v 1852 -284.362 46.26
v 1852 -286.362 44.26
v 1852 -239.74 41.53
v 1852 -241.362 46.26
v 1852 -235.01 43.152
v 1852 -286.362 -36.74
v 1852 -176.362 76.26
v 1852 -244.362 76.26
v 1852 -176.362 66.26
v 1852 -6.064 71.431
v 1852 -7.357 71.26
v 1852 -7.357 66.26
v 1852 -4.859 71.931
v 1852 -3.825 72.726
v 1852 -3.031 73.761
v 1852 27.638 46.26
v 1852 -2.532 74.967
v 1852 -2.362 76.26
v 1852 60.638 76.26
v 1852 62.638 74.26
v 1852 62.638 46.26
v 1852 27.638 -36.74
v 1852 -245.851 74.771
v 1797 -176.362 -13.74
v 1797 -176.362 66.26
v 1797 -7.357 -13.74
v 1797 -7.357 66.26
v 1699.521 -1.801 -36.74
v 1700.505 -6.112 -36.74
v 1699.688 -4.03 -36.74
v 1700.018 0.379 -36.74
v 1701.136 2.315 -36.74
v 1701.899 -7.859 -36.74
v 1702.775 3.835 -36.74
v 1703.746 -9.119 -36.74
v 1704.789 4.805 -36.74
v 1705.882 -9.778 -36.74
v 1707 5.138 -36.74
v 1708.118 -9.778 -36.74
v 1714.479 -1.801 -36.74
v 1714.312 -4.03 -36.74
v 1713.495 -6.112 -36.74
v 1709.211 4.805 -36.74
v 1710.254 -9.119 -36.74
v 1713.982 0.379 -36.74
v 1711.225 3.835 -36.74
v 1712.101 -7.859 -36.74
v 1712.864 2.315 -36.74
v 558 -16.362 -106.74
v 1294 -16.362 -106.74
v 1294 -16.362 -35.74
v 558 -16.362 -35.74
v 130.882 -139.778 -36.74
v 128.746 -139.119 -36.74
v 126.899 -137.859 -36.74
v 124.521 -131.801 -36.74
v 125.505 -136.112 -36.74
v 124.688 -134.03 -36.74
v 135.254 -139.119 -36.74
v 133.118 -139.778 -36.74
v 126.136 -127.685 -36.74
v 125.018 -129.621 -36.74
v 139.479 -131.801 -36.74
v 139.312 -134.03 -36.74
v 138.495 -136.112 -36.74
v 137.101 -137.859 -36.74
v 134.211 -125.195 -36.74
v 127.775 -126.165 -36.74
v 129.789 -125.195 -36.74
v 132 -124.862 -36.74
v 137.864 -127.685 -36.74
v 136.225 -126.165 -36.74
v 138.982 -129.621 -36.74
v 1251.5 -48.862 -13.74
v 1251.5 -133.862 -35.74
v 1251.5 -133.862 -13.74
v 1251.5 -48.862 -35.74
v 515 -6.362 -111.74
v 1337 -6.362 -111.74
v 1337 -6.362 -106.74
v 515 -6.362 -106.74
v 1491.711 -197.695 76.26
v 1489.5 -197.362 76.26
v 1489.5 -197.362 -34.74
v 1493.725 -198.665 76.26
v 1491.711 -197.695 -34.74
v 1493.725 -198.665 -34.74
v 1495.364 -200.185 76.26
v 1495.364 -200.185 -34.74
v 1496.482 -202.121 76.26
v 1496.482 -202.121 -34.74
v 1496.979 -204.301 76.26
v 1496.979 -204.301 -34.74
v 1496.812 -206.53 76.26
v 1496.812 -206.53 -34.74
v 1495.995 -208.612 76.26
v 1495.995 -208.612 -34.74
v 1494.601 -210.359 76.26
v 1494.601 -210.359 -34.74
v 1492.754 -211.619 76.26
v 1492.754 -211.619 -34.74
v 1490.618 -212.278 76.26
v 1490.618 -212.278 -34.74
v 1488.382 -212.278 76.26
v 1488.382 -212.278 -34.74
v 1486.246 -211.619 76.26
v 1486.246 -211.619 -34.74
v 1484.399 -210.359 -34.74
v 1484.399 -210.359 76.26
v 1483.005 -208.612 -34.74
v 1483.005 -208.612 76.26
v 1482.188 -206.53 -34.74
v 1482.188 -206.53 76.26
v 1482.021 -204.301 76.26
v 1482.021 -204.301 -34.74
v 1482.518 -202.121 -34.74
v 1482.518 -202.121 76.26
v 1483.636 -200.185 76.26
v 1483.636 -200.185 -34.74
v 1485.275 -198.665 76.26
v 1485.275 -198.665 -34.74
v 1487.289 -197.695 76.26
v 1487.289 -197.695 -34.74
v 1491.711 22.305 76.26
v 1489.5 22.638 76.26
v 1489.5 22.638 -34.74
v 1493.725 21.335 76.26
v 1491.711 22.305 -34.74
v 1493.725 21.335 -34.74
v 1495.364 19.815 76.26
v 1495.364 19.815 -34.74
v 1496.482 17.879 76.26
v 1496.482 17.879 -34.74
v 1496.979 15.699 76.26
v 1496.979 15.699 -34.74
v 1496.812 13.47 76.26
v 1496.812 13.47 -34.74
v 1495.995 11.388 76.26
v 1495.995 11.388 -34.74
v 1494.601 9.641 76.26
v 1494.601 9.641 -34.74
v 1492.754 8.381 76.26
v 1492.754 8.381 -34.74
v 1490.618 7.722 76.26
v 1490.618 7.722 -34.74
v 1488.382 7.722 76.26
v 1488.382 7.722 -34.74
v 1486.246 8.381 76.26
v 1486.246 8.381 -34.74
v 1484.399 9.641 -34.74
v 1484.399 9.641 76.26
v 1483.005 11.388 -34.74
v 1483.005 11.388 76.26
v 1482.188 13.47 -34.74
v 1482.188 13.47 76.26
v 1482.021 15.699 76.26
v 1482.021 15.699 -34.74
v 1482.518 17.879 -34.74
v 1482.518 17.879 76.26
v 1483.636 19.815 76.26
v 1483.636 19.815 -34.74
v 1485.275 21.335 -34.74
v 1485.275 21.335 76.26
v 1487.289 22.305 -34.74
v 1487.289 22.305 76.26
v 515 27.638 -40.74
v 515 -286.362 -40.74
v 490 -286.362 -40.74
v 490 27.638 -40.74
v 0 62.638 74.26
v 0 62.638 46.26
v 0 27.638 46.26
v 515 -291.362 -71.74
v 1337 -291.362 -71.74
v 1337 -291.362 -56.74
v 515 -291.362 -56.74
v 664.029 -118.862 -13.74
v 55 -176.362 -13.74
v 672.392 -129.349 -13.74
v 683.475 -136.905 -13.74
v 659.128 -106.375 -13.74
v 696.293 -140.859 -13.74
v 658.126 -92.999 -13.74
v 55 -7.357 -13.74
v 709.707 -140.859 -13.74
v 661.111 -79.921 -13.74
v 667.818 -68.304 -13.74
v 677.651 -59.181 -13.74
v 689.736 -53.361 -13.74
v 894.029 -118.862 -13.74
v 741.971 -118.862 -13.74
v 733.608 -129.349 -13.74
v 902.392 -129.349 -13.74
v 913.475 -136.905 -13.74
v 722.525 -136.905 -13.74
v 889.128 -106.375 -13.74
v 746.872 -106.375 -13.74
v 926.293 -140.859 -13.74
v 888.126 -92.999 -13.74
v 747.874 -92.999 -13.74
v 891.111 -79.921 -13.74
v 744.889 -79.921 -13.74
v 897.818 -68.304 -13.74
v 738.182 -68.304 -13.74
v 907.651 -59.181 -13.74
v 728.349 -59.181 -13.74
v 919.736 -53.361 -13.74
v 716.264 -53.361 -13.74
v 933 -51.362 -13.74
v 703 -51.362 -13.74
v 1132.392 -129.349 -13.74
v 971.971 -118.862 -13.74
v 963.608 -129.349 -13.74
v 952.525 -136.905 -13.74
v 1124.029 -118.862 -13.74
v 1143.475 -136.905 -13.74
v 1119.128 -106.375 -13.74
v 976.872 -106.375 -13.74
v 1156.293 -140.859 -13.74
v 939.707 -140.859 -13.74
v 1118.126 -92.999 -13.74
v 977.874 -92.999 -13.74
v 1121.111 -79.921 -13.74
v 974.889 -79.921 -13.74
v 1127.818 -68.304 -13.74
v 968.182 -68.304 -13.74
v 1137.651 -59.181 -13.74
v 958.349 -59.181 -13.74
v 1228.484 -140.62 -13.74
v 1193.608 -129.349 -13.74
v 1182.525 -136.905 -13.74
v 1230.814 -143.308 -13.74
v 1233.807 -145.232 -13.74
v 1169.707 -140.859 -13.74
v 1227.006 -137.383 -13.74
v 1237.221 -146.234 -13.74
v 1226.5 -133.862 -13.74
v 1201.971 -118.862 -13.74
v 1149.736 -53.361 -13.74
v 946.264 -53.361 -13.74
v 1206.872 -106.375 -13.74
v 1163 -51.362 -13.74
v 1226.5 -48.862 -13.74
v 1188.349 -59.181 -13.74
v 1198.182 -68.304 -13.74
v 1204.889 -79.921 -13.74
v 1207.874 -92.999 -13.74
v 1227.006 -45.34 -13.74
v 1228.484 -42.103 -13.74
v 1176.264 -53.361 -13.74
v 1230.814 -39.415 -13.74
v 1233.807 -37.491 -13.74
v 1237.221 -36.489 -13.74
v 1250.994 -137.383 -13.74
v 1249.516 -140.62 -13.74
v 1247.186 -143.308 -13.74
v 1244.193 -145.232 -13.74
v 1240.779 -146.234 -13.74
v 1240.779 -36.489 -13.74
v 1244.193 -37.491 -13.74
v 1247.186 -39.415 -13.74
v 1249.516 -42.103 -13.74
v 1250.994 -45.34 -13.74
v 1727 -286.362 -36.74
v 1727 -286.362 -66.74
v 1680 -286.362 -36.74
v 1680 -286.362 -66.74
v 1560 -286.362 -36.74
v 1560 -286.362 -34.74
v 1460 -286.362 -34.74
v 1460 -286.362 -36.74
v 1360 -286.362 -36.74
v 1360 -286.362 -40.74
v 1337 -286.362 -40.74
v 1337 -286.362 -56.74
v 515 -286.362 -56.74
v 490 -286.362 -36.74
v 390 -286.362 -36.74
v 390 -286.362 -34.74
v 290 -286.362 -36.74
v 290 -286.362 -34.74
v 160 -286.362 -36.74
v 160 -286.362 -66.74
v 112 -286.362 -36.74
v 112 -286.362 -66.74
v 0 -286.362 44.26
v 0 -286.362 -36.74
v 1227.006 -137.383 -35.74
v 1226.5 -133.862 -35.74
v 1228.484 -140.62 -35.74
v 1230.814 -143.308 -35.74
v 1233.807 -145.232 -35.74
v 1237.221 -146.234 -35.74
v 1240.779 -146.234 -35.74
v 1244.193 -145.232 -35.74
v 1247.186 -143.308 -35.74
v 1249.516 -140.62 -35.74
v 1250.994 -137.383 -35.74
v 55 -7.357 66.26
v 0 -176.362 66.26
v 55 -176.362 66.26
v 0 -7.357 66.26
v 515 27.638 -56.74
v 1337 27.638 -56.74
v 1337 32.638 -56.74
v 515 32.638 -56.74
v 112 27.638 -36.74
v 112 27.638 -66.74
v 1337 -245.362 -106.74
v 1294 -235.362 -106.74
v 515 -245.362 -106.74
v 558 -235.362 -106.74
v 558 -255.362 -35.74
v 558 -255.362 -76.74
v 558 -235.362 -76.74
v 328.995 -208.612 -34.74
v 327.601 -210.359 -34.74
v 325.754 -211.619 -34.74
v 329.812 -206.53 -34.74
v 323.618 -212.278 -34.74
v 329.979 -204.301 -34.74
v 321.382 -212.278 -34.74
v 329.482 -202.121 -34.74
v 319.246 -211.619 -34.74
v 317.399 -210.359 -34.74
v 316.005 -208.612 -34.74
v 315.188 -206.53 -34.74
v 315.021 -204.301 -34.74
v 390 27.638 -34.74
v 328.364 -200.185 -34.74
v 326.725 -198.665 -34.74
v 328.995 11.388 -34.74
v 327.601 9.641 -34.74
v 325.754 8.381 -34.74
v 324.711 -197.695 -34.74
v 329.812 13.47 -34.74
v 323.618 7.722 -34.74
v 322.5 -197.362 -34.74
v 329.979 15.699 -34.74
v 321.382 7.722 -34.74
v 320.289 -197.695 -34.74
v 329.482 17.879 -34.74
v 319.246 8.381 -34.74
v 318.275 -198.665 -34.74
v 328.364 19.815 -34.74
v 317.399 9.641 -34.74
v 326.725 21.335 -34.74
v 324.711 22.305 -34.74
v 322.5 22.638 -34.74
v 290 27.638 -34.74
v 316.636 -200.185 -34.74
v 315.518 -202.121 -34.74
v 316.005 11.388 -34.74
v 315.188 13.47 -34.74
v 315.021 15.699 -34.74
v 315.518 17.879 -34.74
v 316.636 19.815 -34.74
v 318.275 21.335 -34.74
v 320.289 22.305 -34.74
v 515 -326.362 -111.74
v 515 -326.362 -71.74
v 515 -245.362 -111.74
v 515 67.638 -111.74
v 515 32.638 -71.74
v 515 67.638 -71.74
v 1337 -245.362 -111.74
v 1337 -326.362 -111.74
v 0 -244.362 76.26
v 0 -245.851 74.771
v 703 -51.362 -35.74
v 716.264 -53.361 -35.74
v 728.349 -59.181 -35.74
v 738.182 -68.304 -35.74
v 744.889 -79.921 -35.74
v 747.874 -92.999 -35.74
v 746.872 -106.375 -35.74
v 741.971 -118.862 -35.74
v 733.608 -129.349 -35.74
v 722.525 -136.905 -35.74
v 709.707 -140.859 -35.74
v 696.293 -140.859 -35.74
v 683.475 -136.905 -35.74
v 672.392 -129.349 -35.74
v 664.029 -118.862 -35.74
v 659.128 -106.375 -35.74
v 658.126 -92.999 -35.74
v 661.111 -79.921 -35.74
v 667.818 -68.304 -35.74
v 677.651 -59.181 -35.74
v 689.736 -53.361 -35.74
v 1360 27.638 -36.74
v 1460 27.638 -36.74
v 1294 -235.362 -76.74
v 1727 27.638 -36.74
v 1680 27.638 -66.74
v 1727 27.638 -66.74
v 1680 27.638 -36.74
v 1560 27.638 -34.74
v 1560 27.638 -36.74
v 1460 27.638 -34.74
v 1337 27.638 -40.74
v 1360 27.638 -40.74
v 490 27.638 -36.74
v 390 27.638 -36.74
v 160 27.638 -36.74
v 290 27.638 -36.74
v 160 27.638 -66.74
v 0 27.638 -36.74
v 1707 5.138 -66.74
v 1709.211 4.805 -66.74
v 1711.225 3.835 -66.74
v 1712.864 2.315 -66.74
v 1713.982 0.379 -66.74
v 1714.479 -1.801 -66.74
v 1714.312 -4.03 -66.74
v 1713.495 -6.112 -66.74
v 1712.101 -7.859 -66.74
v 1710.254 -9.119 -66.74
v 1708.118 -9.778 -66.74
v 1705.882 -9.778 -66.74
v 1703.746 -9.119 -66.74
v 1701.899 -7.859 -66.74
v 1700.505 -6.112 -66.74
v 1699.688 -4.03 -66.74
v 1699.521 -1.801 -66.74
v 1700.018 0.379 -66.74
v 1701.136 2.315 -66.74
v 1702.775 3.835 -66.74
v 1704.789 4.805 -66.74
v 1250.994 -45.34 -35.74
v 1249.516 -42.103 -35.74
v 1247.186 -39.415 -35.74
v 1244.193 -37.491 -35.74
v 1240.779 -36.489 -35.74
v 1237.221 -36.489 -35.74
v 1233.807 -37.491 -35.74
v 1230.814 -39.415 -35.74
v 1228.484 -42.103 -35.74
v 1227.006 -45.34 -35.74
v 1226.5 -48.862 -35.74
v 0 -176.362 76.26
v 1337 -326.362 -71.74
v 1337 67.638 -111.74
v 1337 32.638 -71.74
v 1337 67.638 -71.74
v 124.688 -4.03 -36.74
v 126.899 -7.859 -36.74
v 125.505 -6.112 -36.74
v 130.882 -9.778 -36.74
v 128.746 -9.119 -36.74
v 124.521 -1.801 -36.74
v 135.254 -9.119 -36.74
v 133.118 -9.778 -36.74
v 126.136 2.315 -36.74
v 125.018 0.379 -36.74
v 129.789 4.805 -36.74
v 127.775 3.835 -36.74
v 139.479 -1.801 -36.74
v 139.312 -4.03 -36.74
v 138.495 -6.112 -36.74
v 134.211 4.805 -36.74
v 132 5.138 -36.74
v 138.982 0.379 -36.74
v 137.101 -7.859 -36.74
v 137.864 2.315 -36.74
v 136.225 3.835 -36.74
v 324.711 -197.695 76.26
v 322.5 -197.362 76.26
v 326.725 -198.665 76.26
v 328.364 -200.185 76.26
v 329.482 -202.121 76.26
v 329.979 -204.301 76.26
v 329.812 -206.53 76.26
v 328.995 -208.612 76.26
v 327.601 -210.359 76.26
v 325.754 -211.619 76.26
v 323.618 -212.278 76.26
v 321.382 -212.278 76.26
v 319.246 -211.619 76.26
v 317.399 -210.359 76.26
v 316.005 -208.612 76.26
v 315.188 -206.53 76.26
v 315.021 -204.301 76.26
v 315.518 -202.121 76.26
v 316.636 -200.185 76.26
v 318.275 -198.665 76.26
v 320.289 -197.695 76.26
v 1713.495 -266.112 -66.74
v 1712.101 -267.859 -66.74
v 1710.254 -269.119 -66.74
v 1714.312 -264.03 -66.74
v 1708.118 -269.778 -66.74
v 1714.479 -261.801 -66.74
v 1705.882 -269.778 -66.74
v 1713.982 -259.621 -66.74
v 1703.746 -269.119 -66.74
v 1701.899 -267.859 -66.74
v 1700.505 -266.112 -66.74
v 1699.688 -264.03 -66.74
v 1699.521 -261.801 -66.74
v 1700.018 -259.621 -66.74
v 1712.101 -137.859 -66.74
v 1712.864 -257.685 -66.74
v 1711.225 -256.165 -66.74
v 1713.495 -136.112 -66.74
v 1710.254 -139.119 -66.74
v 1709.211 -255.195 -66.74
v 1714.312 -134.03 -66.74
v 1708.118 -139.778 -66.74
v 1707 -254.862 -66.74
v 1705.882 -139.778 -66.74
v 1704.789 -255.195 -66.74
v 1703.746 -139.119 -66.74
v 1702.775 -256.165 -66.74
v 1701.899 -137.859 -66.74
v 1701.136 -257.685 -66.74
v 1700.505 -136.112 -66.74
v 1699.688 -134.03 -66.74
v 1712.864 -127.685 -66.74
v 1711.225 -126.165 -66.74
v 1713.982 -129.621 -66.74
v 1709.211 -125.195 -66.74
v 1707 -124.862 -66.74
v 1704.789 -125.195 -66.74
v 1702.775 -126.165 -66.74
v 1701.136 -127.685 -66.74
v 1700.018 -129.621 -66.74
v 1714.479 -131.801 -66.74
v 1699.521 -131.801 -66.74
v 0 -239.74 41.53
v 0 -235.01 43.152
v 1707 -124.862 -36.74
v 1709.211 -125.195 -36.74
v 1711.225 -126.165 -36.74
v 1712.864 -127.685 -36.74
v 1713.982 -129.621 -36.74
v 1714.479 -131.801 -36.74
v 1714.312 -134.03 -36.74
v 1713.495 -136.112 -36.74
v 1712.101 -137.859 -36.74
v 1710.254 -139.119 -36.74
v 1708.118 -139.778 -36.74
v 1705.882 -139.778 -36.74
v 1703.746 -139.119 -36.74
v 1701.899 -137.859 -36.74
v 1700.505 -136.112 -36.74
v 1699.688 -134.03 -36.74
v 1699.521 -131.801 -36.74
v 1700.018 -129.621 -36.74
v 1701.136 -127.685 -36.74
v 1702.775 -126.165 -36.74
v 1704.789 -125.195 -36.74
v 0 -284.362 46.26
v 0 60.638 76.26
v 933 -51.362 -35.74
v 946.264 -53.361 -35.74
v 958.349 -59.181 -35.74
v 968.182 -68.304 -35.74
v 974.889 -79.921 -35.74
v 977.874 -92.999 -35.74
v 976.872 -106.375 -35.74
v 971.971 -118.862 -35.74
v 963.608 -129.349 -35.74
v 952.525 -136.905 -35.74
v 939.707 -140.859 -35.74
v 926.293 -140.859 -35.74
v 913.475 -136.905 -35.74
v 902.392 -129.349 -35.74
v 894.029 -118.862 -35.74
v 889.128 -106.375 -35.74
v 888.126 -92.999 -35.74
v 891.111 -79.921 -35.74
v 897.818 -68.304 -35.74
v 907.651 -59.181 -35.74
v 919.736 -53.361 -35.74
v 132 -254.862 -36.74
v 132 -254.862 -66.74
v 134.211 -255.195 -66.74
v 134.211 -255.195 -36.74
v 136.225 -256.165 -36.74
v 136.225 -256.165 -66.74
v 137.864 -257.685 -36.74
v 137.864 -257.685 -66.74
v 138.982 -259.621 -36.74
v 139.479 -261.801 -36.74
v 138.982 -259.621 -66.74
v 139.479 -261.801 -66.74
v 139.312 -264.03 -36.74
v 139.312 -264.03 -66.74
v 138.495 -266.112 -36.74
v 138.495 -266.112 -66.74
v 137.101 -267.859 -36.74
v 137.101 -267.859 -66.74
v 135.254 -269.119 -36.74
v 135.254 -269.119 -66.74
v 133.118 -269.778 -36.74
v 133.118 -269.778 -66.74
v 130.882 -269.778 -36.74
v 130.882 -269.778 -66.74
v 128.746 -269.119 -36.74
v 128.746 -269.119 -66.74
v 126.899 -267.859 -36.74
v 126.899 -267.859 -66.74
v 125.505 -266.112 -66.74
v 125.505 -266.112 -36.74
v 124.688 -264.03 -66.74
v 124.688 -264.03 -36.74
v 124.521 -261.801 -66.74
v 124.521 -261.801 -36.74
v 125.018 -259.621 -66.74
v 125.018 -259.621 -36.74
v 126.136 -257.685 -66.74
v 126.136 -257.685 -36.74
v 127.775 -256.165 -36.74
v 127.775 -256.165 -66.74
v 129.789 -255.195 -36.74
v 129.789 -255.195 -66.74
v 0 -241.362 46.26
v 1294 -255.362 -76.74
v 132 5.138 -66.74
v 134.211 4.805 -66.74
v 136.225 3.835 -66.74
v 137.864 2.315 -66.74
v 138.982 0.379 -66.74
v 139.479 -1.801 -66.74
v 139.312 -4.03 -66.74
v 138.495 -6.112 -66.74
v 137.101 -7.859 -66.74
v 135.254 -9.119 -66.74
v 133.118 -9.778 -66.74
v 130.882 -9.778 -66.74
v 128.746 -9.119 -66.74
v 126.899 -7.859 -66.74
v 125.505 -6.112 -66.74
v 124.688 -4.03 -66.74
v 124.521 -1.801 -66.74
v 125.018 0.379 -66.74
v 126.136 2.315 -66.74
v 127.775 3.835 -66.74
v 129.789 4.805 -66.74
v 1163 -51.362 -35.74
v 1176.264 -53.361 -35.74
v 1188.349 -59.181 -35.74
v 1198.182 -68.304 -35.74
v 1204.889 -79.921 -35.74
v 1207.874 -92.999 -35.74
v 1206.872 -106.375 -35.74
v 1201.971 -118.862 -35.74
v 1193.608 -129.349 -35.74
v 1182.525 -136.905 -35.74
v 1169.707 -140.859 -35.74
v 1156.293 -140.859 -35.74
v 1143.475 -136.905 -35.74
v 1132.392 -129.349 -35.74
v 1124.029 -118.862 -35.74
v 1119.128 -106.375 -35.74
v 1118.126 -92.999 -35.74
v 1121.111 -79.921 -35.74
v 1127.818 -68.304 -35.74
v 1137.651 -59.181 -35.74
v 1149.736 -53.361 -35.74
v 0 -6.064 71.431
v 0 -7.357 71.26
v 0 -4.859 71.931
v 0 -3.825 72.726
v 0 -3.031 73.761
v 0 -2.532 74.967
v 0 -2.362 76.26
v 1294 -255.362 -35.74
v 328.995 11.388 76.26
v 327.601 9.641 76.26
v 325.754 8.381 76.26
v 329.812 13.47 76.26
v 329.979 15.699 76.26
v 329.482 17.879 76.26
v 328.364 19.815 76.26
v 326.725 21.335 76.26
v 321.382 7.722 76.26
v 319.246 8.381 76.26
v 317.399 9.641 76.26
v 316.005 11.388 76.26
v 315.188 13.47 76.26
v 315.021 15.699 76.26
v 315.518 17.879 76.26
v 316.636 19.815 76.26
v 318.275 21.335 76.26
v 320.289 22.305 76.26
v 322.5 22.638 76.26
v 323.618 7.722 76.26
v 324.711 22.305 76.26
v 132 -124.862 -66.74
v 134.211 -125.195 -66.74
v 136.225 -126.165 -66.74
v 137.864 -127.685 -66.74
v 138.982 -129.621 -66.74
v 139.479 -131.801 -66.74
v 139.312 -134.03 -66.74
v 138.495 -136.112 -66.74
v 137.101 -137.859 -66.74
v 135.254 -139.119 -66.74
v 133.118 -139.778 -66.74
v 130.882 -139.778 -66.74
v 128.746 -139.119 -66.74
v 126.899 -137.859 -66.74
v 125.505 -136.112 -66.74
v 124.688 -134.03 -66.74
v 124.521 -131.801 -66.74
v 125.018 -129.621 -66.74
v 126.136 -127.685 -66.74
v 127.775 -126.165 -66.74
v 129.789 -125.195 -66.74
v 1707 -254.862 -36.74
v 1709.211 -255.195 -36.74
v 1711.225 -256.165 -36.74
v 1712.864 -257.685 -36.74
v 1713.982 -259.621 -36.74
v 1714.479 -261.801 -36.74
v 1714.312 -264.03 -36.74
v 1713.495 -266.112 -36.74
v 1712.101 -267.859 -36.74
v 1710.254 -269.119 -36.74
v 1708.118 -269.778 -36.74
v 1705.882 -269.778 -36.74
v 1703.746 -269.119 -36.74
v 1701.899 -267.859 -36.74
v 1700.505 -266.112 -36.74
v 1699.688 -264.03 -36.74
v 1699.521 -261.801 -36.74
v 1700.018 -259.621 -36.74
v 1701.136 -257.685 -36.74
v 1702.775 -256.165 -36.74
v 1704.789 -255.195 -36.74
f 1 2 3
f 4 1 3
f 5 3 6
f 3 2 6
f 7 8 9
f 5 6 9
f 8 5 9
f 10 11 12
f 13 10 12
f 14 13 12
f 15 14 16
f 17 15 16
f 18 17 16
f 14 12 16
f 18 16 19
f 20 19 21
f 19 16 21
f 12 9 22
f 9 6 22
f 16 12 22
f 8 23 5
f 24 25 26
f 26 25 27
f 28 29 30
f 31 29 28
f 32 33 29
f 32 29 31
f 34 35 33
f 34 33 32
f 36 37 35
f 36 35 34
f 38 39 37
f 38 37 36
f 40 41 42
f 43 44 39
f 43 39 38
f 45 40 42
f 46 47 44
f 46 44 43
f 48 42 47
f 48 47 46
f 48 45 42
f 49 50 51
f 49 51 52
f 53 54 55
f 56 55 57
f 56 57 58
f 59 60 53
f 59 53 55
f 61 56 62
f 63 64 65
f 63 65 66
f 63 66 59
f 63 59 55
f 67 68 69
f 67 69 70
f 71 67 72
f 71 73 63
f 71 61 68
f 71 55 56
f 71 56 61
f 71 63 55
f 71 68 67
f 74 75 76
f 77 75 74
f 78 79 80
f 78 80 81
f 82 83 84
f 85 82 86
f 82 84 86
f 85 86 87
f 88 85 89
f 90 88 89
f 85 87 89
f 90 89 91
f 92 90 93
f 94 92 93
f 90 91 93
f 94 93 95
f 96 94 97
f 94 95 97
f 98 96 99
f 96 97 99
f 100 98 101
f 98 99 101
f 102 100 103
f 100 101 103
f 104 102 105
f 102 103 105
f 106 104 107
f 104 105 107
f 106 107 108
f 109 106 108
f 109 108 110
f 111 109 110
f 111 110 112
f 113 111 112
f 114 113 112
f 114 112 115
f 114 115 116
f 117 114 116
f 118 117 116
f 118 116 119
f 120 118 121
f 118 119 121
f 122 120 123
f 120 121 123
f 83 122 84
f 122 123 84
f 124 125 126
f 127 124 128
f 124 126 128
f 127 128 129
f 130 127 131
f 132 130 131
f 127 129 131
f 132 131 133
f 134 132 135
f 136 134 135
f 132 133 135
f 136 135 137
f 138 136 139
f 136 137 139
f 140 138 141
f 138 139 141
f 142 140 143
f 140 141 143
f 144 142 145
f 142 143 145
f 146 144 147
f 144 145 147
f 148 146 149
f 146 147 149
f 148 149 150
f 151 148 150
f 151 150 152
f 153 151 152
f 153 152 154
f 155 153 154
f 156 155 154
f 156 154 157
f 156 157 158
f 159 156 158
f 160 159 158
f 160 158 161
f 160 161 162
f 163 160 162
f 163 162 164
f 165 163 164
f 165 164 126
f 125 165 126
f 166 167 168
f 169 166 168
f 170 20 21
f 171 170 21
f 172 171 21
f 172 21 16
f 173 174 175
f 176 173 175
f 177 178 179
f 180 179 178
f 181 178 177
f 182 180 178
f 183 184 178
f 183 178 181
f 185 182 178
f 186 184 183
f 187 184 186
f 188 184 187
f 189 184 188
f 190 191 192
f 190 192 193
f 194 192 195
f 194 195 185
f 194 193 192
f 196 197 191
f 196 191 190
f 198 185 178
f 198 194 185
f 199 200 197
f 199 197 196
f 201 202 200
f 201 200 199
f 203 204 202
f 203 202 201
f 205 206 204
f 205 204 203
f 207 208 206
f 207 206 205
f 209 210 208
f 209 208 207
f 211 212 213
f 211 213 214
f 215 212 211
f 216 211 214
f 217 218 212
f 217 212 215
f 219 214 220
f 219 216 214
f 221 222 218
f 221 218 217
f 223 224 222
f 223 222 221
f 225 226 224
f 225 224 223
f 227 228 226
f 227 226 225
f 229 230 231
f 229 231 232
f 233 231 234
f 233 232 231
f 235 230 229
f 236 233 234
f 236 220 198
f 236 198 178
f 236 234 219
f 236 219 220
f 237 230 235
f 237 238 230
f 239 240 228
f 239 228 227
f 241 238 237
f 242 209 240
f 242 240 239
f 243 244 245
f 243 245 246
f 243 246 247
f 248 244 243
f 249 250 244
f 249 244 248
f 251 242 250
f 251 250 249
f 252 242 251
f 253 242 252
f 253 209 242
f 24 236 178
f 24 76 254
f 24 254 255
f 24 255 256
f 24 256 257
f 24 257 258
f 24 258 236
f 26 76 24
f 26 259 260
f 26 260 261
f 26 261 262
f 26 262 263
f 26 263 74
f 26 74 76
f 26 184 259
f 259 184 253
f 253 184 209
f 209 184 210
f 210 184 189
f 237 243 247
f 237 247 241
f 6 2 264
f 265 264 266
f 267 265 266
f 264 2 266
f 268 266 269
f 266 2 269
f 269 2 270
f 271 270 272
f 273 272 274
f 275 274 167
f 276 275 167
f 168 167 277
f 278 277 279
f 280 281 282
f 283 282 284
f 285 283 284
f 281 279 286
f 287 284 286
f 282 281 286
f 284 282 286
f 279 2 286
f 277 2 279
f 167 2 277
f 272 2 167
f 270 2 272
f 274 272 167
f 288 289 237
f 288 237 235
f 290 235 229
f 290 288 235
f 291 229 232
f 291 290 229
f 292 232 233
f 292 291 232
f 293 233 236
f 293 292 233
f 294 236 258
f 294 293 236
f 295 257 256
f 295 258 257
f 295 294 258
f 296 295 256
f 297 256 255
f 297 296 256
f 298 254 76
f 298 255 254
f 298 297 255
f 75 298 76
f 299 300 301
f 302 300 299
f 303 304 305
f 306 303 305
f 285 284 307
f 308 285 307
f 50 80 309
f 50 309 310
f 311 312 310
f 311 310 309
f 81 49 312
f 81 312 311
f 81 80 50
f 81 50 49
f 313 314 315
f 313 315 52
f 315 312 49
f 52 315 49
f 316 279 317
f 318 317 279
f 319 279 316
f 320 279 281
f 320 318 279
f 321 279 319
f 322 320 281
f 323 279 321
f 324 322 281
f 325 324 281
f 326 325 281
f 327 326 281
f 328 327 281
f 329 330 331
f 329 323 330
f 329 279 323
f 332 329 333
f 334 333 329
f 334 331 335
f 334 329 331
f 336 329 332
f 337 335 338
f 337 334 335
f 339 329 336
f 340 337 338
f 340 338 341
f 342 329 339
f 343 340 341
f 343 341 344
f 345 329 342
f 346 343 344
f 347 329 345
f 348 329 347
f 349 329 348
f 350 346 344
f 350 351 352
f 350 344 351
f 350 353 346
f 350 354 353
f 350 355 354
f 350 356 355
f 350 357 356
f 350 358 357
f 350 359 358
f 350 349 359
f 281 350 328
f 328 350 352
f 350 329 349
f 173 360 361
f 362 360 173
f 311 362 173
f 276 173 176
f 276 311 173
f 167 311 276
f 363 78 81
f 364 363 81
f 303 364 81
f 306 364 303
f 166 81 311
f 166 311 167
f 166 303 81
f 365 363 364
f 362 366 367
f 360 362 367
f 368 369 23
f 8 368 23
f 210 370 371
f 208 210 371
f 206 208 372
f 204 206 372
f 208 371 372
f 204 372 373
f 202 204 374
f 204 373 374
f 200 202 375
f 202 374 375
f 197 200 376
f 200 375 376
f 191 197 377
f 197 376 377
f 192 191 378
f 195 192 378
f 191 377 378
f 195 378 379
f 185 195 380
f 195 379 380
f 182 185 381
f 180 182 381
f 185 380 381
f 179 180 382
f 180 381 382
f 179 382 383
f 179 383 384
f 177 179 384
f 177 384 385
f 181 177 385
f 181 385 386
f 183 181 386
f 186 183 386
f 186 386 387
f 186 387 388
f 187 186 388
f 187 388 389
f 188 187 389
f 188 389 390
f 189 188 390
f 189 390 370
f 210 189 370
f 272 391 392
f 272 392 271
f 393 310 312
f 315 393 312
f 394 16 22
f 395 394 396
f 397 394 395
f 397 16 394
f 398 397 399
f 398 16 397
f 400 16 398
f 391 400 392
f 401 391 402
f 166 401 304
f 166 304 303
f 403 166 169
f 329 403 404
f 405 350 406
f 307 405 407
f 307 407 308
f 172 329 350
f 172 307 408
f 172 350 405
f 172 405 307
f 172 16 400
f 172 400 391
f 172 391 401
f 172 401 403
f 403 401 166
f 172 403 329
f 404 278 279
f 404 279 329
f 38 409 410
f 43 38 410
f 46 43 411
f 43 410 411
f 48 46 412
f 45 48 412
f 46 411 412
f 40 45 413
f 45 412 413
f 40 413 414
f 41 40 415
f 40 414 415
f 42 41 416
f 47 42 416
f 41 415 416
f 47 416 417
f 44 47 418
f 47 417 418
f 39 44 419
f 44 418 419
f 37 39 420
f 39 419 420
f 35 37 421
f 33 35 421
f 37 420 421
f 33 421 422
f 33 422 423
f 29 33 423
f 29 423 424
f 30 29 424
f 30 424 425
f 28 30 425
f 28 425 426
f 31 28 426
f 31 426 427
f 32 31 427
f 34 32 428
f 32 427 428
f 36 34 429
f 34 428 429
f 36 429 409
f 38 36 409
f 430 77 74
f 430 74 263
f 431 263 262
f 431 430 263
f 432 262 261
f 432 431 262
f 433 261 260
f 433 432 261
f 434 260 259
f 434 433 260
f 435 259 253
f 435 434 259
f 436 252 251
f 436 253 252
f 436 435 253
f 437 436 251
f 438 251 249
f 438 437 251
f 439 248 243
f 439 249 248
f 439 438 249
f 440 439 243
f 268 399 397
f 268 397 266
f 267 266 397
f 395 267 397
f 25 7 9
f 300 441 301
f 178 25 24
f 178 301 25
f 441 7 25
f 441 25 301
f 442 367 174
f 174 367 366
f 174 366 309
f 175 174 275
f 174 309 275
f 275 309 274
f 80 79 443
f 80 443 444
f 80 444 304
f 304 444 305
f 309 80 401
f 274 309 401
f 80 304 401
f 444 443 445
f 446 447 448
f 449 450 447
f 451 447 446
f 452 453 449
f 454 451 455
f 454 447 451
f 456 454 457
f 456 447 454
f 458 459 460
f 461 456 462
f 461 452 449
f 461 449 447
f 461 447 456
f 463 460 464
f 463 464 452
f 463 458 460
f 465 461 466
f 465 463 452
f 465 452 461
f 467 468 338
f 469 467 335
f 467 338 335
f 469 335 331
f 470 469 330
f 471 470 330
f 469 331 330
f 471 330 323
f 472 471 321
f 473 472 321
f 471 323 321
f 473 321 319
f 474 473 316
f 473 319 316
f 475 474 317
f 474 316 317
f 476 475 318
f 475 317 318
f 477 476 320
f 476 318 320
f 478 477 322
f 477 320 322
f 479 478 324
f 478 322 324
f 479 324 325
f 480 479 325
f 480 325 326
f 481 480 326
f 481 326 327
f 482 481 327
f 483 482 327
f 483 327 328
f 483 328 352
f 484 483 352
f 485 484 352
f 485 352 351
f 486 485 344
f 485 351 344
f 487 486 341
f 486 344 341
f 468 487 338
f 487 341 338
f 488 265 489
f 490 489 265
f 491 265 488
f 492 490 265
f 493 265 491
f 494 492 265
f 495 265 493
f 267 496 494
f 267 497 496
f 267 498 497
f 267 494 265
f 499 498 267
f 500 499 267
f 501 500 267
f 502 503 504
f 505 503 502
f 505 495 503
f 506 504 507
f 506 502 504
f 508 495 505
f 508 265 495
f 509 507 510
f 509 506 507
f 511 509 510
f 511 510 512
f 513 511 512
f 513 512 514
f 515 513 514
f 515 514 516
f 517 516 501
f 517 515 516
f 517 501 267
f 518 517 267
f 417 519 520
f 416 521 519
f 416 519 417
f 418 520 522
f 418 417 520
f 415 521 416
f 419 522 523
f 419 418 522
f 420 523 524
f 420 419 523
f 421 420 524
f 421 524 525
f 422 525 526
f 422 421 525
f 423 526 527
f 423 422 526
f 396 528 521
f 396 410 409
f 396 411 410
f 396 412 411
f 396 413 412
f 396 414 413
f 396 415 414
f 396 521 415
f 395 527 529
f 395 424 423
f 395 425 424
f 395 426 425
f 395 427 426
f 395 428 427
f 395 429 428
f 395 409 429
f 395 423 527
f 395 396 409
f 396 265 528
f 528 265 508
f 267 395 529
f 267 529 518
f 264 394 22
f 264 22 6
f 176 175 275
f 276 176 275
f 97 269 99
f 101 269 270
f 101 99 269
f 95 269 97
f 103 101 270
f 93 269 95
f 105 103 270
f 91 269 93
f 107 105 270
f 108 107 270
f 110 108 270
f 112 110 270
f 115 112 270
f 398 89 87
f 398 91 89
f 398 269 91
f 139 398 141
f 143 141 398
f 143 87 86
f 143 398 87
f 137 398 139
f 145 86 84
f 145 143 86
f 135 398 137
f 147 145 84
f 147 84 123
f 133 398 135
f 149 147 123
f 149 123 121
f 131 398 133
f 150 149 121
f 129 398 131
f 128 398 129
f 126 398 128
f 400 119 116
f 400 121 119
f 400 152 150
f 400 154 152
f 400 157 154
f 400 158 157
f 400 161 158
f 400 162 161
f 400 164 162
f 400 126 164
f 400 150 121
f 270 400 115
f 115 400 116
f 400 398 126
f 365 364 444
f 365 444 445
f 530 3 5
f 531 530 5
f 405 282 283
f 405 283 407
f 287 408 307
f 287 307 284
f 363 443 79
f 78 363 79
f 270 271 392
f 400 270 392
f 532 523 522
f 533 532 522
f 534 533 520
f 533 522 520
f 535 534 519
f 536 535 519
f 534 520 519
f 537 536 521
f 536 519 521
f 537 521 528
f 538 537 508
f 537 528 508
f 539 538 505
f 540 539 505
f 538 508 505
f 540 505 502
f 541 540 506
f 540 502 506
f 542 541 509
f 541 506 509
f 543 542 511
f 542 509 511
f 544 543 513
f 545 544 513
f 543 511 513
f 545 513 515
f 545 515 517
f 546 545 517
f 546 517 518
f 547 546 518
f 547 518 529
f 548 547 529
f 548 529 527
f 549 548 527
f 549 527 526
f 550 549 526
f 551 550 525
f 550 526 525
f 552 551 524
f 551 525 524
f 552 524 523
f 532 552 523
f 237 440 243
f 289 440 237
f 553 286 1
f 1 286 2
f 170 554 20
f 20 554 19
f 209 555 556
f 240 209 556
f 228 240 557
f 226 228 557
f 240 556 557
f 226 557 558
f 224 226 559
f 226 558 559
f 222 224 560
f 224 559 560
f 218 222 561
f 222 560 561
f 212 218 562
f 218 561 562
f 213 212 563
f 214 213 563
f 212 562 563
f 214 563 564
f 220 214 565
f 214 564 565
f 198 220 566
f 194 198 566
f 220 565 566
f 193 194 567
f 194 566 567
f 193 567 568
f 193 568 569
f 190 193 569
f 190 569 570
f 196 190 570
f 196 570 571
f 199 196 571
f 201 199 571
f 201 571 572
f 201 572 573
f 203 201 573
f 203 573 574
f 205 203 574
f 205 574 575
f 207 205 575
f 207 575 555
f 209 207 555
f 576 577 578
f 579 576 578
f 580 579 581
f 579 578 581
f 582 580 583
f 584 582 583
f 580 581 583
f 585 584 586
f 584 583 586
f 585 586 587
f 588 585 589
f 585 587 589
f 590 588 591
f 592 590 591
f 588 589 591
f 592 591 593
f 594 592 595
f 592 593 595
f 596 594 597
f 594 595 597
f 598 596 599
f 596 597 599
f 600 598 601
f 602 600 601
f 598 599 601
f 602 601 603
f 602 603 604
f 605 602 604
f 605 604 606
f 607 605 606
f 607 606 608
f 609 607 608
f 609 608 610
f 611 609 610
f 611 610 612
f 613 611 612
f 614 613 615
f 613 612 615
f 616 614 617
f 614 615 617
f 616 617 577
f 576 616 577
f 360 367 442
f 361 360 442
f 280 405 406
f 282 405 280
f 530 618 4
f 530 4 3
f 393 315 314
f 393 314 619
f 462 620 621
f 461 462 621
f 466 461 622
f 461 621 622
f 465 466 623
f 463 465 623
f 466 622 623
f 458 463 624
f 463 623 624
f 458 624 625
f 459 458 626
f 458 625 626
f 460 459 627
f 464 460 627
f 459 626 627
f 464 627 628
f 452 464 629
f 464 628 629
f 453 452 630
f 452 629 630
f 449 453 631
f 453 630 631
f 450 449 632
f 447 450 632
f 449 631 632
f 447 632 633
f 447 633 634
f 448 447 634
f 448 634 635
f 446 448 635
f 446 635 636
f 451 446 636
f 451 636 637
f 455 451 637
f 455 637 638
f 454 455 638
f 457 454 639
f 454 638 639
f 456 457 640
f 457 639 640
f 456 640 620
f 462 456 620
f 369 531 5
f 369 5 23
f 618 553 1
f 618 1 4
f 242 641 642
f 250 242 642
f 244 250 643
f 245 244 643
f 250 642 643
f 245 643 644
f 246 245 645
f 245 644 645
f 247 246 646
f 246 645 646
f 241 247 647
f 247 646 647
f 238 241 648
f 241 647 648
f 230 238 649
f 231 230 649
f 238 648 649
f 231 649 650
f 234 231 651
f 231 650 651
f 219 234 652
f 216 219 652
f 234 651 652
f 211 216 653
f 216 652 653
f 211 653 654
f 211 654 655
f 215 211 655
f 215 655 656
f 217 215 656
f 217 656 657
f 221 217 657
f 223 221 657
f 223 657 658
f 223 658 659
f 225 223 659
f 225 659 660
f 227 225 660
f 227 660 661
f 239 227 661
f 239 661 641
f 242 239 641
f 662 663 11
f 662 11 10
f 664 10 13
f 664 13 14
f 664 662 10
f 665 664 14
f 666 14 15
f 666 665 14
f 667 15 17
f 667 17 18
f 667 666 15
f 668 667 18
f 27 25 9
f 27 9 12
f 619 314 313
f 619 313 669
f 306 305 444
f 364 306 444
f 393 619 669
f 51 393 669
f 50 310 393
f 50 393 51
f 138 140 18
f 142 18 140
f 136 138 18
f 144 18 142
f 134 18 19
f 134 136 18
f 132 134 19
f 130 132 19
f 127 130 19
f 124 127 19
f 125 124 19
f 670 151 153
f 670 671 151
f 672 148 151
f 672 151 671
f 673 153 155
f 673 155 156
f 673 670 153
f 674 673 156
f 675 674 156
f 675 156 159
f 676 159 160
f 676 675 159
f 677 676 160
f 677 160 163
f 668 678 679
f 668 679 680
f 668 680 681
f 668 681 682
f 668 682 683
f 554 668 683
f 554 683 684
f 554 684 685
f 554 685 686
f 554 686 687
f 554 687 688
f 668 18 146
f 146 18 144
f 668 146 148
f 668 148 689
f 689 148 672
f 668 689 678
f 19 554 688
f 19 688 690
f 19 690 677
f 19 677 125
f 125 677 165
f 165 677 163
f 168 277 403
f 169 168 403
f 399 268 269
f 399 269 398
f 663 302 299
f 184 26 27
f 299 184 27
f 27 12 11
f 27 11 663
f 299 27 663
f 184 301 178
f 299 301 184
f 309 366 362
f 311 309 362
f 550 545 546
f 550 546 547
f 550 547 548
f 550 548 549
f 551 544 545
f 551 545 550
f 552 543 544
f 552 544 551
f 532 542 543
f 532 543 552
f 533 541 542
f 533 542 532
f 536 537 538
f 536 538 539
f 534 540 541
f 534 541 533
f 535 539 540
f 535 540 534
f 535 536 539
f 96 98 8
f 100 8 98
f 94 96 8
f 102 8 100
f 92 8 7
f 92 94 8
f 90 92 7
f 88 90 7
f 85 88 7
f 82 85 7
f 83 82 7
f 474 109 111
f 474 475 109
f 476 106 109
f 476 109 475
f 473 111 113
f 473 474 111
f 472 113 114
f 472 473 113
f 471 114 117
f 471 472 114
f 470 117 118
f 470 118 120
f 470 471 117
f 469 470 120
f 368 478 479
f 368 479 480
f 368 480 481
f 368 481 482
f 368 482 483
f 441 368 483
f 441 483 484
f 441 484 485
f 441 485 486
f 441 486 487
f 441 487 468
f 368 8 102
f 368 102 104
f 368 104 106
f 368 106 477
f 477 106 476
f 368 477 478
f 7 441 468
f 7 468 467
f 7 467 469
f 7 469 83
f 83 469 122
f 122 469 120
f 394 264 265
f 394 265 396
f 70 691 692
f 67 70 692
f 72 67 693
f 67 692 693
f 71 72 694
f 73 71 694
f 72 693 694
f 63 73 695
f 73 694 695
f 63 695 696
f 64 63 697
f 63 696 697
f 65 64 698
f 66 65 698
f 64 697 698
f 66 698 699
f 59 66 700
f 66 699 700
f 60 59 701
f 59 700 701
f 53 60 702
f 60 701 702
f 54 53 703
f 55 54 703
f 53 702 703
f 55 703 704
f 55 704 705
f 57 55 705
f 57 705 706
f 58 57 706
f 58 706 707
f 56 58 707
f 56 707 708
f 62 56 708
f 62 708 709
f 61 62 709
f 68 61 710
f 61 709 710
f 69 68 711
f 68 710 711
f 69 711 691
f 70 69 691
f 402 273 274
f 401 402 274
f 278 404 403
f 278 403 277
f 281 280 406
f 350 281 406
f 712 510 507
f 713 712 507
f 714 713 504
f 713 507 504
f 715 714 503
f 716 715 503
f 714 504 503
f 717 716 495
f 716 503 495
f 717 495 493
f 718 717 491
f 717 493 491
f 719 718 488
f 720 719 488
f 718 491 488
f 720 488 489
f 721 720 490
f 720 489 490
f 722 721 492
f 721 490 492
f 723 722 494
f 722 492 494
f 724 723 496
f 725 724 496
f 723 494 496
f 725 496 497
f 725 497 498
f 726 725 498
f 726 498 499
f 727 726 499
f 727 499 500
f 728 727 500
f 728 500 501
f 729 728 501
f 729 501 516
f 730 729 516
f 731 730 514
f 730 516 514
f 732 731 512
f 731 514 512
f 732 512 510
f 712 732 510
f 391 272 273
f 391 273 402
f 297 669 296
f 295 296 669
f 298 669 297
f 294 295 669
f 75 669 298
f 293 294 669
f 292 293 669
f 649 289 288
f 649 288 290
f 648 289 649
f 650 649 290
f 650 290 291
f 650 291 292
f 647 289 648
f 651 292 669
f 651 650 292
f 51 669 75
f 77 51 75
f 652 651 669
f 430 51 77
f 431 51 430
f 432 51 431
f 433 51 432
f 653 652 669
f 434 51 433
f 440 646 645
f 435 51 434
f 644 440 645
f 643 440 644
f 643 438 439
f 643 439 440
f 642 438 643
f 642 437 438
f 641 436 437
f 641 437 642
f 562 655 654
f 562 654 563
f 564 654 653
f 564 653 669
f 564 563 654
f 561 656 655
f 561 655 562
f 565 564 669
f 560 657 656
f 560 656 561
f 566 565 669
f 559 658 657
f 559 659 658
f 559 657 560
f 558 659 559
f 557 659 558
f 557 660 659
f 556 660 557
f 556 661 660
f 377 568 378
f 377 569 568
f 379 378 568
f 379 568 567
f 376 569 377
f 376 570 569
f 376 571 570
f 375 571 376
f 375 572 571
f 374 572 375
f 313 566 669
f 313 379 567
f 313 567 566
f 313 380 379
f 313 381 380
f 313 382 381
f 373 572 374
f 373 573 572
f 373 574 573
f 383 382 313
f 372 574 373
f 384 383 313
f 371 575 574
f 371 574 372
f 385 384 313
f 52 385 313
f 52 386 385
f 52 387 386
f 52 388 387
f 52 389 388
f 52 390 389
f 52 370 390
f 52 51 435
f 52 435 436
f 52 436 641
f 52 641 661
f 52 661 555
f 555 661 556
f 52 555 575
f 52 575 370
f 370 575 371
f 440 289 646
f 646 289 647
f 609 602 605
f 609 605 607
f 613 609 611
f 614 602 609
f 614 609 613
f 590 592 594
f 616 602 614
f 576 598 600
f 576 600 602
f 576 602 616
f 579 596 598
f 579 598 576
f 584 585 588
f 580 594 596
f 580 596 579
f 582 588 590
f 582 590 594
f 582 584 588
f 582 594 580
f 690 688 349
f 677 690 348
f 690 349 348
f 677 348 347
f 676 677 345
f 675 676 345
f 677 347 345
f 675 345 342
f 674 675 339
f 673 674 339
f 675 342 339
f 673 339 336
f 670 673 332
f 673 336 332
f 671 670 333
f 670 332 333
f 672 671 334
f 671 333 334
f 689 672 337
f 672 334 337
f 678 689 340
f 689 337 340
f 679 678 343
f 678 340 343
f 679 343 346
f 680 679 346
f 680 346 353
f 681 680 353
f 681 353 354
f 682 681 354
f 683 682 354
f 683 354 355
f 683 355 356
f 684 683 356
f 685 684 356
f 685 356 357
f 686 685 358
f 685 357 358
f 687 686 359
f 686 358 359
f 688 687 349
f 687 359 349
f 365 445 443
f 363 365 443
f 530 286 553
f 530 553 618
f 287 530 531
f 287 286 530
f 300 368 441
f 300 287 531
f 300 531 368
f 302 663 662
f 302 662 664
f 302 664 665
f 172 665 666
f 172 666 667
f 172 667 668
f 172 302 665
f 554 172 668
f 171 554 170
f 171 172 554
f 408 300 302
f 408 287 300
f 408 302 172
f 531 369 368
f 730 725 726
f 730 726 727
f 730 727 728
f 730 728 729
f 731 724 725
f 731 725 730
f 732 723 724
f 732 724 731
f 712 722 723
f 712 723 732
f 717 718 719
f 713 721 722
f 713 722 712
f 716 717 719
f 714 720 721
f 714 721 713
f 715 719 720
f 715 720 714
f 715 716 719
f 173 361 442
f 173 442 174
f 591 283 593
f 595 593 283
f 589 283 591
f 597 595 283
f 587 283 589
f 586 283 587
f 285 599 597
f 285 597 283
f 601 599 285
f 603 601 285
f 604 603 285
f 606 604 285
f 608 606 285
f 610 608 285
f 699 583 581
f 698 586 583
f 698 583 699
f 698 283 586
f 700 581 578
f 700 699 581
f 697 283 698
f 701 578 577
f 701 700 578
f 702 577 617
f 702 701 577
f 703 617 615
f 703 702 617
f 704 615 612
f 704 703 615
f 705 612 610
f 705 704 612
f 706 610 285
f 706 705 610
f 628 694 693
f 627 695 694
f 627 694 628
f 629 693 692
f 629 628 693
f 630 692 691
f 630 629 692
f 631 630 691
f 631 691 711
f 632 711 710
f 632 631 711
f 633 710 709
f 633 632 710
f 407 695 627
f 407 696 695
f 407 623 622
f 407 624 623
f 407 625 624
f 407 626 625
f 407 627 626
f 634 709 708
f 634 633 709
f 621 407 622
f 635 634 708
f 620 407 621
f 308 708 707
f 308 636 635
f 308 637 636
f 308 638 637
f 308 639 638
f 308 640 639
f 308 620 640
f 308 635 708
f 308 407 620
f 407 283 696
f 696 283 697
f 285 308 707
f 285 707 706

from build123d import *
from OCP.BRepFilletAPI import BRepFilletAPI_MakeChamfer

# Parameters (mm, degrees)
EXTRUDE_1_DEPTH      = 1852
FILLET_1_R           = 5
CHAMFER_1_SIZE       = 2
CHAMFER_1_SIZE2      = 1.574468085
EXTRUDE_2_DEPTH      = 822
SKETCH_5_W           = 47
SKETCH_5_H           = 314
EXTRUDE_3_DEPTH      = 30
SKETCH_7_W           = 100
SKETCH_7_H           = 314
CUT_EXTRUDE_1_DEPTH  = 2
SKETCH_8_W           = 23
SKETCH_8_H           = 314
EXTRUDE_4_DEPTH      = 4
SKETCH_9_W           = 48
SKETCH_9_H           = 314
EXTRUDE_5_DEPTH      = 30
SKETCH_10_W          = 100
SKETCH_10_H          = 314
CUT_EXTRUDE_2_DEPTH  = 2
SKETCH_11_W          = 25
SKETCH_11_H          = 314
EXTRUDE_6_DEPTH      = 4
SKETCH_12_W          = 1742
SKETCH_12_H          = 169.004058013
CUT_EXTRUDE_3_DEPTH  = 80
SKETCH_13_W          = 822
SKETCH_13_H          = 239
CUT_EXTRUDE_4_DEPTH  = 5
SKETCH_14_W          = 736
SKETCH_14_H          = 219
CUT_EXTRUDE_5_DEPTH  = 71
SKETCH_15_R          = 45
CUT_EXTRUDE_6_DEPTH  = 1884.868315719
SKETCH_16_W          = 736
SKETCH_16_H          = 41
CUT_EXTRUDE_7_DEPTH  = 20
SKETCH_17_R          = 7.5
CUT_EXTRUDE_8_DEPTH  = 30
SKETCH_18_R          = 7.5
CUT_EXTRUDE_9_DEPTH  = 113
SKETCH_21_R          = 7.5
CUT_EXTRUDE_11_DEPTH = 111
SKETCH_23_R          = 7.5
CUT_EXTRUDE_12_DEPTH = 111


with BuildPart() as part:
    # 草图2 → 凸台-拉伸1 (new body)
    with BuildSketch(Plane(origin=(0, 0, 0), x_dir=(0, 0, -1), z_dir=(1, 0, 0))):
        Polygon((-76.260223553, 62.638496495), (-46.260223553, 62.638496495), (-46.260223553, 27.638496495), (36.739776447, 27.638496495), (36.739776447, -286.361503505), (-46.260223553, -286.361503505), (-46.260223553, -241.361503505), (-41.530493824, -239.739881883), (-43.152115445, -235.010152153), (-76.260223553, -246.361503505), (-76.260223553, -176.361503505), (-66.260223553, -176.361503505), (-66.260223553, -7.357445492), (-71.260223553, -7.357445492), (-71.260223553, -2.361503505), (-76.260223553, -2.361503505), align=None)
    extrude(amount=EXTRUDE_1_DEPTH)

    # 圆角1
    # the kernel refuses this fillet: 5 mm, written as the material it adds along each edge
    with BuildSketch(Plane(origin=(0, -2.361503505, 71.260223553), x_dir=(0, -1, 0), z_dir=(1, 0, 0))) as fillet_1_piece_1_section:
        with BuildLine():
            CenterArc((FILLET_1_R, -FILLET_1_R), FILLET_1_R, 90, 90)
            Line((0, -FILLET_1_R), (0, 0))
            Line((0, 0), (FILLET_1_R, 0))
        make_face()
    fillet_1_piece_1 = extrude(amount=1852, mode=Mode.PRIVATE)
    fillet_1_piece_1 = split(fillet_1_piece_1, bisect_by=Plane(origin=(926, -7.357445492, 72.392274368), z_dir=(0, 1, 0)), keep=Keep.TOP, mode=Mode.PRIVATE)
    add(fillet_1_piece_1)

    # 倒角1: one chamfer whose edges measure the first distance from different faces: ONE call of the kernel's chamfer builder (chamfer() names one face for all edges)
    chamfer_1_edges_1 = [part.edges().sort_by_distance(p)[0] for p in [
        (926, 62.638496495, 76.260223553),
        (926, -286.361503505, 46.260223553),
    ]]
    chamfer_1_edges_2 = [part.edges().sort_by_distance(p)[0] for p in [
        (926, -246.361503505, 76.260223553),
    ]]
    chamfer_1_side_2 = [part.faces().sort_by_distance(p)[0] for p in [
        (926, -211.361503505, 76.260223553),
    ]]
    chamfer_1 = BRepFilletAPI_MakeChamfer(part.part.solid().wrapped)
    for e in chamfer_1_edges_1:
        chamfer_1.Add(CHAMFER_1_SIZE, e.wrapped)
    for e in chamfer_1_edges_2:
        chamfer_1.Add(CHAMFER_1_SIZE, CHAMFER_1_SIZE2, e.wrapped, chamfer_1_side_2[0].wrapped)  # the first distance lies on this face
    add(Compound.cast(chamfer_1.Shape()), mode=Mode.REPLACE)

    # 草图4 → 凸台-拉伸2 (add)
    with BuildSketch(Plane(origin=(1337, 0, 0), x_dir=(0, 0, -1), z_dir=(1, 0, 0))):
        Polygon((36.739776447, 27.638496495), (56.739776447, 27.638496495), (56.739776447, 32.638496495), (71.739776447, 32.638496495), (71.739776447, 67.638496495), (111.739776447, 67.638496495), (111.739776447, -326.361503505), (71.739776447, -326.361503505), (71.739776447, -291.361503505), (56.739776447, -291.361503505), (56.739776447, -286.361503505), (36.739776447, -286.361503505), align=None)
    extrude(amount=-EXTRUDE_2_DEPTH)

    # 草图5 → 凸台-拉伸3 (add)
    with BuildSketch(Plane(origin=(0, 0, -36.739776447), x_dir=(-1, 0, 0), z_dir=(0, 0, -1))):
        with Locations((-1703.5, -129.361503505)):
            Rectangle(SKETCH_5_W, SKETCH_5_H)
    extrude(amount=EXTRUDE_3_DEPTH)

    # 草图7 → 切除-拉伸1 (cut)
    with BuildSketch(Plane(origin=(0, 0, -36.739776447), x_dir=(-1, 0, 0), z_dir=(0, 0, -1))):
        with Locations((-1510, -129.361503505)):
            Rectangle(SKETCH_7_W, SKETCH_7_H)
    extrude(amount=-CUT_EXTRUDE_1_DEPTH, mode=Mode.SUBTRACT)

    # 草图8 → 凸台-拉伸4 (add)
    with BuildSketch(Plane(origin=(0, 0, -36.739776447), x_dir=(-1, 0, 0), z_dir=(0, 0, -1))):
        with Locations((-1348.5, -129.361503505)):
            Rectangle(SKETCH_8_W, SKETCH_8_H)
    extrude(amount=EXTRUDE_4_DEPTH)

    # 草图9 → 凸台-拉伸5 (add)
    with BuildSketch(Plane(origin=(0, 0, -36.739776447), x_dir=(-1, 0, 0), z_dir=(0, 0, -1))):
        with Locations((-136, -129.361503505)):
            Rectangle(SKETCH_9_W, SKETCH_9_H)
    extrude(amount=EXTRUDE_5_DEPTH)

    # 草图10 → 切除-拉伸2 (cut)
    with BuildSketch(Plane(origin=(0, 0, -36.739776447), x_dir=(-1, 0, 0), z_dir=(0, 0, -1))):
        with Locations((-340, -129.361503505)):
            Rectangle(SKETCH_10_W, SKETCH_10_H)
    extrude(amount=-CUT_EXTRUDE_2_DEPTH, mode=Mode.SUBTRACT)

    # 草图11 → 凸台-拉伸6 (add)
    with BuildSketch(Plane(origin=(0, 0, -36.739776447), x_dir=(-1, 0, 0), z_dir=(0, 0, -1))):
        with Locations((-502.5, -129.361503505)):
            Rectangle(SKETCH_11_W, SKETCH_11_H)
    extrude(amount=EXTRUDE_6_DEPTH)

    # 草图12 → 切除-拉伸3 (cut)
    with BuildSketch(Plane.XY.offset(66.260223553)):
        with Locations((926, -91.859474499)):
            Rectangle(SKETCH_12_W, SKETCH_12_H)
    extrude(amount=-CUT_EXTRUDE_3_DEPTH, mode=Mode.SUBTRACT)

    # 草图13 → 切除-拉伸4 (cut)
    with BuildSketch(Plane(origin=(0, 0, -111.739776447), x_dir=(-1, 0, 0), z_dir=(0, 0, -1))):
        with Locations((-926, -125.861503505)):
            Rectangle(SKETCH_13_W, SKETCH_13_H)
    extrude(amount=-CUT_EXTRUDE_4_DEPTH, mode=Mode.SUBTRACT)

    # 草图14 → 切除-拉伸5 (cut)
    with BuildSketch(Plane(origin=(0, 0, -106.739776447), x_dir=(-1, 0, 0), z_dir=(0, 0, -1))):
        with Locations((-926, -125.861503505)):
            Rectangle(SKETCH_14_W, SKETCH_14_H)
    extrude(amount=-CUT_EXTRUDE_5_DEPTH, mode=Mode.SUBTRACT)

    # 草图15 → 切除-拉伸6 (cut, through all)
    with BuildSketch(Plane(origin=(0, 0, -35.739776447), x_dir=(-1, 0, 0), z_dir=(0, 0, -1))):
        with Locations(Location((-1163, -96.361503505, 0), (0, 0, 90))):
            Circle(SKETCH_15_R)
        with Locations(Location((-933, -96.361503505, 0), (0, 0, 90))):
            Circle(SKETCH_15_R)
        with Locations(Location((-703, -96.361503505, 0), (0, 0, 90))):
            Circle(SKETCH_15_R)
        with BuildLine():
            Line((-1226.5, -48.861503505), (-1226.5, -133.861503505))
            ThreePointArc((-1226.5, -133.861503505), (-1239, -146.361503505), (-1251.5, -133.861503505))
            Line((-1251.5, -133.861503505), (-1251.5, -48.861503505))
            ThreePointArc((-1251.5, -48.861503505), (-1239, -36.361503505), (-1226.5, -48.861503505))
        make_face()
    extrude(amount=-CUT_EXTRUDE_6_DEPTH, mode=Mode.SUBTRACT)

    # 草图16 → 切除-拉伸7 (cut)
    with BuildSketch(Plane(origin=(0, -235.361503505, 0), x_dir=(1, 0, 0), z_dir=(0, 1, 0))):
        with Locations((926, 56.239776447)):
            Rectangle(SKETCH_16_W, SKETCH_16_H)
    extrude(amount=-CUT_EXTRUDE_7_DEPTH, mode=Mode.SUBTRACT)

    # 草图17 → 切除-拉伸8 (cut)
    with BuildSketch(Plane(origin=(0, 0, -66.739776447), x_dir=(-1, 0, 0), z_dir=(0, 0, -1))):
        with Locations(Location((-1707, -2.361503505, 0), (0, 0, 90))):
            Circle(SKETCH_17_R)
        with Locations(Location((-1707, -132.361503505, 0), (0, 0, 90))):
            Circle(SKETCH_17_R)
        with Locations(Location((-1707, -262.361503505, 0), (0, 0, 90))):
            Circle(SKETCH_17_R)
        with Locations(Location((-132, -2.361503505, 0), (0, 0, 90))):
            Circle(SKETCH_17_R)
        with Locations(Location((-132, -132.361503505, 0), (0, 0, 90))):
            Circle(SKETCH_17_R)
        with Locations(Location((-132, -262.361503505, 0), (0, 0, 90))):
            Circle(SKETCH_17_R)
    extrude(amount=-CUT_EXTRUDE_8_DEPTH, mode=Mode.SUBTRACT)

    # 草图18 → 切除-拉伸9 (cut)
    with BuildSketch(Plane(origin=(0, 0, -36.739776447), x_dir=(-1, 0, 0), z_dir=(0, 0, -1))):
        with Locations(Location((-1489.500000001, 15.138496495, 0), (0, 0, 90))):
            Circle(SKETCH_18_R)
    extrude(amount=-CUT_EXTRUDE_9_DEPTH, mode=Mode.SUBTRACT)

    # 草图21 → 切除-拉伸11 (cut)
    with BuildSketch(Plane(origin=(0, 0, -34.739776447), x_dir=(-1, 0, 0), z_dir=(0, 0, -1))):
        with Locations(Location((-322.5, 15.138496495, 0), (0, 0, 90))):
            Circle(SKETCH_21_R)
    extrude(amount=-CUT_EXTRUDE_11_DEPTH, mode=Mode.SUBTRACT)

    # 草图23 → 切除-拉伸12 (cut)
    with BuildSketch(Plane(origin=(0, 0, -34.739776447), x_dir=(-1, 0, 0), z_dir=(0, 0, -1))):
        with Locations(Location((-1489.500000001, -204.861503505, 0), (0, 0, 90))):
            Circle(SKETCH_23_R)
        with Locations(Location((-322.5, -204.861503505, 0), (0, 0, 90))):
            Circle(SKETCH_23_R)
    extrude(amount=-CUT_EXTRUDE_12_DEPTH, mode=Mode.SUBTRACT)


solid = part.part
